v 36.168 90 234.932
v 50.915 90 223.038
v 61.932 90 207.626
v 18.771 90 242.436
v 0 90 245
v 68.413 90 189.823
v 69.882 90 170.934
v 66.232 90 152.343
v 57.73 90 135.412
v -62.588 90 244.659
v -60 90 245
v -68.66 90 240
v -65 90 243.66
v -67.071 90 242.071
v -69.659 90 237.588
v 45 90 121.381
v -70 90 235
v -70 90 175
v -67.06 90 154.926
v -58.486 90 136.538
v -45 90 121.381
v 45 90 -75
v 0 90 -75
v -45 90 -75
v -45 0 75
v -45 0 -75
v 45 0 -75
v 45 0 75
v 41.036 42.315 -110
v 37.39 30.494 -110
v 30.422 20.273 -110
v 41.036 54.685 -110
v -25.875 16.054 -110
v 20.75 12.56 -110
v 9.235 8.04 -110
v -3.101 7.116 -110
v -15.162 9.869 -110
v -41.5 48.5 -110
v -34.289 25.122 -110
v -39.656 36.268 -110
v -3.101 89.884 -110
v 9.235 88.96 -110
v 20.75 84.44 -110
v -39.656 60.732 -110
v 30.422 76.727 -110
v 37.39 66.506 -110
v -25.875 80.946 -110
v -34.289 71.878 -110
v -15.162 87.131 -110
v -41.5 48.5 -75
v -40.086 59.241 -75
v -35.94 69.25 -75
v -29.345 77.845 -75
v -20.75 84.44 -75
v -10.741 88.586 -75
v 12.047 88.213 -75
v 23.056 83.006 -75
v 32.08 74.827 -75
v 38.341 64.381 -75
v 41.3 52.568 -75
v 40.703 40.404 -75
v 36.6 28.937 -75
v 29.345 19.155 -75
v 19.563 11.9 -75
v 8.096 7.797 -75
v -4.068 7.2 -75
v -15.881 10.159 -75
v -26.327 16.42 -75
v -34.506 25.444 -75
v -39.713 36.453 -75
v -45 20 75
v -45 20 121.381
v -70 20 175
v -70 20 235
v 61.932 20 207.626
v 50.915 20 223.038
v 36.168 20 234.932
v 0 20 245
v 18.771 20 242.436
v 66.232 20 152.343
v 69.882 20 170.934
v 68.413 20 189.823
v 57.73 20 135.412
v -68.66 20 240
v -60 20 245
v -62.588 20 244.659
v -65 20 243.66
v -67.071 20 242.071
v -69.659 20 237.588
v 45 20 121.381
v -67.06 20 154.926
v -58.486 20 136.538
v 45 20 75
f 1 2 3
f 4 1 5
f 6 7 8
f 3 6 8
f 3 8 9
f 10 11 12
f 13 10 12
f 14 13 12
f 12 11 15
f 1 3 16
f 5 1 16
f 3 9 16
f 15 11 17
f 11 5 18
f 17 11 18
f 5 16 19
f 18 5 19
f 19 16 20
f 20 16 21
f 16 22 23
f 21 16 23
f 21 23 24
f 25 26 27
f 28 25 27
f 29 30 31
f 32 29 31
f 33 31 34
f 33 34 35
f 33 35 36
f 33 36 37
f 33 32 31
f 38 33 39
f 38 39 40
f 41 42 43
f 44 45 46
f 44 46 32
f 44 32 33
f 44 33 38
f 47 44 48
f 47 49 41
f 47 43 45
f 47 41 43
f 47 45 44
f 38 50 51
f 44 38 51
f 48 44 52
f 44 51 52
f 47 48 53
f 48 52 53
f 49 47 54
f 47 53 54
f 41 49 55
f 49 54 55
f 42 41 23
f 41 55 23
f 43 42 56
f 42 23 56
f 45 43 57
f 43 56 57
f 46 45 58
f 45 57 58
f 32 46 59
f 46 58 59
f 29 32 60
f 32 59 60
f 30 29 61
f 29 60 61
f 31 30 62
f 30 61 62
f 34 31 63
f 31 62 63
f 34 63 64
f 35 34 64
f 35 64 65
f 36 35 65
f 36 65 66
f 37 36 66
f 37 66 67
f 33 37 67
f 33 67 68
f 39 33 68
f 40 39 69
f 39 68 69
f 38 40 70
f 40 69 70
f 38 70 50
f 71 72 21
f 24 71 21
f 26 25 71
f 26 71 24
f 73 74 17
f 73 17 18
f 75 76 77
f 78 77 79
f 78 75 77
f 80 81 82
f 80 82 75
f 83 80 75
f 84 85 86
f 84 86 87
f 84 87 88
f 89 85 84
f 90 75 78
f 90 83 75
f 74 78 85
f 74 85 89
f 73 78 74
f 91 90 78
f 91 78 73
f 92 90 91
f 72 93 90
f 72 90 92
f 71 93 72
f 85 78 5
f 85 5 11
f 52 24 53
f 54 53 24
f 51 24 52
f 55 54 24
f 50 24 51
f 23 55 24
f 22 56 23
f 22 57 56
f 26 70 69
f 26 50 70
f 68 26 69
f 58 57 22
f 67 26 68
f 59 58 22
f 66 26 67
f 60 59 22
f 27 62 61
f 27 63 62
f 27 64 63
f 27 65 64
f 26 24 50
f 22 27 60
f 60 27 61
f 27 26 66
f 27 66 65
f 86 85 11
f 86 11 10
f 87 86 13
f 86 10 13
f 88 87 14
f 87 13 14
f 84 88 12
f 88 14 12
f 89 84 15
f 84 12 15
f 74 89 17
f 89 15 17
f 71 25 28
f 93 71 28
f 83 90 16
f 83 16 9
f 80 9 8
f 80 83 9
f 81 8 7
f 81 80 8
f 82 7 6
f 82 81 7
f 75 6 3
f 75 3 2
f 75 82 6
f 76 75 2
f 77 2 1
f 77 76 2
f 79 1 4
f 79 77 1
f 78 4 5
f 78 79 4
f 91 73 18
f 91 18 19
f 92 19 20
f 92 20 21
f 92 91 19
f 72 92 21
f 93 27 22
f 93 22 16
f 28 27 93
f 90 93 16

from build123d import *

# Parameters (mm, degrees)
SKETCH2_W           = 90
SKETCH2_H           = 150
BOSS_EXTRUDE1_DEPTH = 20
BOSS_EXTRUDE2_DEPTH = 70
FILLET1_R           = 10
SKETCH4_R           = 41.5
BOSS_EXTRUDE3_DEPTH = 35


with BuildPart() as part:
    # Sketch2 → Boss-Extrude1 (new body)
    with BuildSketch(Plane(origin=(0, 0, 0), x_dir=(1, 0, 0), z_dir=(0, 1, 0))):
        Rectangle(SKETCH2_W, SKETCH2_H)
    extrude(amount=BOSS_EXTRUDE1_DEPTH)

    # Sketch3 → Boss-Extrude2 (add)
    with BuildSketch(Plane(origin=(0, 20, 0), x_dir=(1, 0, 0), z_dir=(0, 1, 0))):
        with BuildLine():
            Line((-45, 75), (45, 75))
            Line((45, 75), (45, -121.380973526))
            ThreePointArc((45, -121.380973526), (65.777396776, -198.944395449), (0, -245))
            Line((0, -245), (-70, -245))
            Line((-70, -245), (-70, -175))
            ThreePointArc((-70, -175), (-63.442887702, -145.419601085), (-45, -121.380973526))
            Line((-45, -121.380973526), (-45, 75))
        make_face()
    extrude(amount=BOSS_EXTRUDE2_DEPTH)

    # Fillet1
    fillet1_edges = [part.edges().sort_by_distance(p)[0] for p in [
        (-70, 55, 245),
    ]]
    fillet(fillet1_edges, radius=FILLET1_R)

    # Sketch4 → Boss-Extrude3 (add)
    with BuildSketch(Plane(origin=(0, 0, -75), x_dir=(-1, 0, 0), z_dir=(0, 0, -1))):
        with Locations((0, 48.5)):
            Circle(SKETCH4_R)
    extrude(amount=BOSS_EXTRUDE3_DEPTH)


solid = part.part
